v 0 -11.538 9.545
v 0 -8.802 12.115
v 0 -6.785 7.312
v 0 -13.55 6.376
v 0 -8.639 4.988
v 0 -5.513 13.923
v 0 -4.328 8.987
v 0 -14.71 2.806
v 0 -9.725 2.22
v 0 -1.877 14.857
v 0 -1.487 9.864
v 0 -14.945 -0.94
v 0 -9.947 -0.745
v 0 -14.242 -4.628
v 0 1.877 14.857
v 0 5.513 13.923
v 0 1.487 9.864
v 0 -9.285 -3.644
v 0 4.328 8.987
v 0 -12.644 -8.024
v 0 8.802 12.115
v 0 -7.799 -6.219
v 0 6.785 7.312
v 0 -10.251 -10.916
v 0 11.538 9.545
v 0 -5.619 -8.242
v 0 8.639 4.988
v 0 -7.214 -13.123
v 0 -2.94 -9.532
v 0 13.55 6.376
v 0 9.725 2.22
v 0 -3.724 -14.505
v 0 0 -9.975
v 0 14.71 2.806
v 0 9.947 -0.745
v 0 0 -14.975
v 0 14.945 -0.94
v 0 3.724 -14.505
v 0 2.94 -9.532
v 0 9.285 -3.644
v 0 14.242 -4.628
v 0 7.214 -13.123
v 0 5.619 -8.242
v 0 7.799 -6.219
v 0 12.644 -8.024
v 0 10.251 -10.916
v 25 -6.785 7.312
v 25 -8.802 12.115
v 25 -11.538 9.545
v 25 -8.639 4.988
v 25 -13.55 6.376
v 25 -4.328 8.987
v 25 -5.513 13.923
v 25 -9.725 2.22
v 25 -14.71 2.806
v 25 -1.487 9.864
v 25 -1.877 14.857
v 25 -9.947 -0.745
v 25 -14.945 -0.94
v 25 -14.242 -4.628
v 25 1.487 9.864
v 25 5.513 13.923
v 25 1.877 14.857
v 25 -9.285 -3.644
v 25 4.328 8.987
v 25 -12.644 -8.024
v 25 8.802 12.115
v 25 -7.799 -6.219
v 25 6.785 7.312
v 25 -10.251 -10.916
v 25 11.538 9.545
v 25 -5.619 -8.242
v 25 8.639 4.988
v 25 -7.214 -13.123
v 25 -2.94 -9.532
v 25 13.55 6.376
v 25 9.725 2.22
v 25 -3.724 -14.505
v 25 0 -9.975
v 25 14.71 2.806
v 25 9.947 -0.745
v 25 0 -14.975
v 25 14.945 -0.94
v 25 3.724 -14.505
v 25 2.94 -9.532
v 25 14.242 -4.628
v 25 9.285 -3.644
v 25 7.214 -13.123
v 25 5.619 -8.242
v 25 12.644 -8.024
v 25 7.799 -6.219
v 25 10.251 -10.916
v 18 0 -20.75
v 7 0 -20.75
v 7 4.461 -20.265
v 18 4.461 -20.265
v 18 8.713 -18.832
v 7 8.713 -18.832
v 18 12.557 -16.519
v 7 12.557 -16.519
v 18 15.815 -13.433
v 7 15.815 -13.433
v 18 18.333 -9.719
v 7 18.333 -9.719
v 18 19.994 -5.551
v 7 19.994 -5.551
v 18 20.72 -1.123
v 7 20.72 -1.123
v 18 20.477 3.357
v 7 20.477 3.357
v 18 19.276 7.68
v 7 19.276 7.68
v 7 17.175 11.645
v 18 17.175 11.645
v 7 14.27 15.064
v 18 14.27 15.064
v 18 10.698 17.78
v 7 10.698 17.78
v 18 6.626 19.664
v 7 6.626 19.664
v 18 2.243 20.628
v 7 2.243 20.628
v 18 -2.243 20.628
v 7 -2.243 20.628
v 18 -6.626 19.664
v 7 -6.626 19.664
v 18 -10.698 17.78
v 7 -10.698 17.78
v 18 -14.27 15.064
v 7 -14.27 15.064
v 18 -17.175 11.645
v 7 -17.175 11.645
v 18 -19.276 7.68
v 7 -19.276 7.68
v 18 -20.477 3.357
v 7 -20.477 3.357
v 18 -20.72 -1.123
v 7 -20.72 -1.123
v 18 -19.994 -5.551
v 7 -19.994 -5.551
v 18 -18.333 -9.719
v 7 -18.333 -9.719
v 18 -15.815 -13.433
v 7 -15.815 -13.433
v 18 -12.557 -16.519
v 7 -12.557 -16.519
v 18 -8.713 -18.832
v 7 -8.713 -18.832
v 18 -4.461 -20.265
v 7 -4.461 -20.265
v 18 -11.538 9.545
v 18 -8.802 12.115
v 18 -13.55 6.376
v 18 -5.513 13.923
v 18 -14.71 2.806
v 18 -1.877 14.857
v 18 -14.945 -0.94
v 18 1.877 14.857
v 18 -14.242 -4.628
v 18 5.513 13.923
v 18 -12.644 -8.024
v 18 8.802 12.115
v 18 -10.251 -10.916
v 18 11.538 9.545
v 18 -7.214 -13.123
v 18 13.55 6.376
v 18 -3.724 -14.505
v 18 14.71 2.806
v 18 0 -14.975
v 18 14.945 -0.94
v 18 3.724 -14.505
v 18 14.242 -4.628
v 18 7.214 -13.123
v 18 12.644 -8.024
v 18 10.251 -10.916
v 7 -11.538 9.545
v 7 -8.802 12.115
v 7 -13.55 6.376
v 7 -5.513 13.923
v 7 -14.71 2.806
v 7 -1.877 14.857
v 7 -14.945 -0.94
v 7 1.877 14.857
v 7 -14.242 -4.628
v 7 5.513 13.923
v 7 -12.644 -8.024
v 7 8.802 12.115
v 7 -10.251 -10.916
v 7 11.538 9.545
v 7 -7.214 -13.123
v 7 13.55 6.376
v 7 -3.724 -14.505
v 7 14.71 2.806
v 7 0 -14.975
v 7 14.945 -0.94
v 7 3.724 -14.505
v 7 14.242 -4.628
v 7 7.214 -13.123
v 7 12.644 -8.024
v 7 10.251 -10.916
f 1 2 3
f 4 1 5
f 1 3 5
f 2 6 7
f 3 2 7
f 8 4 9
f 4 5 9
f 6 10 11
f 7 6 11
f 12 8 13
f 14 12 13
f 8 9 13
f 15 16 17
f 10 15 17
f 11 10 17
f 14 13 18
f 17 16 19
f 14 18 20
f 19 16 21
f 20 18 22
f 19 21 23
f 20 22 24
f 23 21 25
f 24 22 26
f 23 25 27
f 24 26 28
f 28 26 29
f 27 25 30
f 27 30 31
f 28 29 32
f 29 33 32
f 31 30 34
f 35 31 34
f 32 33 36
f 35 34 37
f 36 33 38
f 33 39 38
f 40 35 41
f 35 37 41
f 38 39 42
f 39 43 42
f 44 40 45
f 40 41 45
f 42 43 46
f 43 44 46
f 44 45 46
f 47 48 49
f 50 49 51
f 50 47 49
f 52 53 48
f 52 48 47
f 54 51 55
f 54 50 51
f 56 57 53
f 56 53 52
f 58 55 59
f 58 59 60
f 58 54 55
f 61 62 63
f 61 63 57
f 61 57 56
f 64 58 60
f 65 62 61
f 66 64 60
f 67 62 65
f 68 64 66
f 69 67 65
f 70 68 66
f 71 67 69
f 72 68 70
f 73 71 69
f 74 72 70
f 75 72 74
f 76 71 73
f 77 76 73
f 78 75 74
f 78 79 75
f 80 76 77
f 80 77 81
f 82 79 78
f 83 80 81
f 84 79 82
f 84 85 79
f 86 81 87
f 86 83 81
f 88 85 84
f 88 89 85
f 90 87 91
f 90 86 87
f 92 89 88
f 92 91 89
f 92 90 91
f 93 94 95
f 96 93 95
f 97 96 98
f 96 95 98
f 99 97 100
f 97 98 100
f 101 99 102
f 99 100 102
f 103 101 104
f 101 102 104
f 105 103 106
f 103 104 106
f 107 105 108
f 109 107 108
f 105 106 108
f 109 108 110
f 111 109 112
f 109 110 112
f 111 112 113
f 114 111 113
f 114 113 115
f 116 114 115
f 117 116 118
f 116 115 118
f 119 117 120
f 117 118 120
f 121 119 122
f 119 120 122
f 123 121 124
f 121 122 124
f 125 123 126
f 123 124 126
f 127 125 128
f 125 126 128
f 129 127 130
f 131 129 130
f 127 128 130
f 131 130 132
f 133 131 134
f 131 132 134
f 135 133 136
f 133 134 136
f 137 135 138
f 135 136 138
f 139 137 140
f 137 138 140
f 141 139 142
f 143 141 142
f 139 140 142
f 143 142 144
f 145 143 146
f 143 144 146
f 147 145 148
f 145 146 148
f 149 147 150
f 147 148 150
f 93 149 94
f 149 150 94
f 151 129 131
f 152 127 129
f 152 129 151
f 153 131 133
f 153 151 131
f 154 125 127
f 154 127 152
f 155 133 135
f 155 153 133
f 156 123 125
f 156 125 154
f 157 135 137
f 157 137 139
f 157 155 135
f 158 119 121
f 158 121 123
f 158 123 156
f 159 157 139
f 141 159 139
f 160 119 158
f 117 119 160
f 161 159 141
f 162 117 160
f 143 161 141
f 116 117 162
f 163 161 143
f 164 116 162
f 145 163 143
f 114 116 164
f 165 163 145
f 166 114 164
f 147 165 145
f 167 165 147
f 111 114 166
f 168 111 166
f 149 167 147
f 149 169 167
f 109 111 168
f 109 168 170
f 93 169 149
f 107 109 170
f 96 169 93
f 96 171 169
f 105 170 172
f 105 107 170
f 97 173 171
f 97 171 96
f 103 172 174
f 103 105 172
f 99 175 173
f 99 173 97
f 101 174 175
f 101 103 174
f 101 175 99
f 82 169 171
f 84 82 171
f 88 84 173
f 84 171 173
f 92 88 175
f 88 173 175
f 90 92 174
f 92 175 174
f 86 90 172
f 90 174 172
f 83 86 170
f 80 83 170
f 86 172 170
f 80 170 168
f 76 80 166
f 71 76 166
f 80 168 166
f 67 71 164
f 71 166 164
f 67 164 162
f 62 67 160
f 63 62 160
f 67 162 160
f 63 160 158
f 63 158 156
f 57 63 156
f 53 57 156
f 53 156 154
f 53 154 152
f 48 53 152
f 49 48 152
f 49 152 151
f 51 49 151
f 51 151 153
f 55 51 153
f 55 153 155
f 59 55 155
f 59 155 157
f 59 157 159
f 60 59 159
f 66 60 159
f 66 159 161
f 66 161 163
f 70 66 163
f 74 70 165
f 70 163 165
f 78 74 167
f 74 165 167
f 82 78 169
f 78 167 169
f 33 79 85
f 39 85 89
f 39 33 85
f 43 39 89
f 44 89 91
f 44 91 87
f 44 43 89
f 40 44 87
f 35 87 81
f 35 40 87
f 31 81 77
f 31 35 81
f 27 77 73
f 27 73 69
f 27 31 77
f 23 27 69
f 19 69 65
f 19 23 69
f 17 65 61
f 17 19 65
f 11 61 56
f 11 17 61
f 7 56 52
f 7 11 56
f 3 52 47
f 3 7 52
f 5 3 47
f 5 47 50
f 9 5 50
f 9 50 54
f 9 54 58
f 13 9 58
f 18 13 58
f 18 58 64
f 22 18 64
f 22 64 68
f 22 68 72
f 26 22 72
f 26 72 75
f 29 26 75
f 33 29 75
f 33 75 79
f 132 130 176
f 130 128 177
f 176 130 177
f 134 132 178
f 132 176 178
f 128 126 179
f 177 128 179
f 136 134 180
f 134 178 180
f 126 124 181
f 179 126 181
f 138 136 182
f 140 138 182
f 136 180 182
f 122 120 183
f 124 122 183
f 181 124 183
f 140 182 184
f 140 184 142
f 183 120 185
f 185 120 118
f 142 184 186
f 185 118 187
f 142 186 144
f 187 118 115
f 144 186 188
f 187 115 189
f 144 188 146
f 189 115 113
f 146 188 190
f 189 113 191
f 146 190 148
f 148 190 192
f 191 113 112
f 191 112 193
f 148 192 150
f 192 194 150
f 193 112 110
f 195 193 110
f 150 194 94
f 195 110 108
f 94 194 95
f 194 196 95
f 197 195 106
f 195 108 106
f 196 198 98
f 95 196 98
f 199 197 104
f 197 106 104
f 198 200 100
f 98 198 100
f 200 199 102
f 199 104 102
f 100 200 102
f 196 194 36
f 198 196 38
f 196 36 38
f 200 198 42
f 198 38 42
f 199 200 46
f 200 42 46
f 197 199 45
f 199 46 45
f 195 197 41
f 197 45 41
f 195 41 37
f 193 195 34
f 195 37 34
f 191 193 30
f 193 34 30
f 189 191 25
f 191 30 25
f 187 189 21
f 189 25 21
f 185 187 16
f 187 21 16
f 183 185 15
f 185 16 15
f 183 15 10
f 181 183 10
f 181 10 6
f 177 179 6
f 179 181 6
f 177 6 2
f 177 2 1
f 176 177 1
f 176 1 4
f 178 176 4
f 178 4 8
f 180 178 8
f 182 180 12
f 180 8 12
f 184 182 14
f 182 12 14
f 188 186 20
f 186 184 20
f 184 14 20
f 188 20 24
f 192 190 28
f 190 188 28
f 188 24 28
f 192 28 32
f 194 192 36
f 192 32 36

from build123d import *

# Parameters (mm, degrees)
SKETCH1_R                = 14.975
SKETCH1_R_2              = 9.975
BOSS_EXTRUDE1_DEPTH      = 25
BOSS_EXTRUDE2_DEPTH      = 5.5
BOSS_EXTRUDE2_DEPTH_BACK = 5.5
SKETCH2_R                = 20.75
SKETCH2_R_2              = 9.975


with BuildPart() as part:
    # Sketch1 → Boss-Extrude1 (new body)
    with BuildSketch(Plane(origin=(0, 0, 0), x_dir=(0, 0, -1), z_dir=(1, 0, 0))):
        Circle(SKETCH1_R)
        Circle(SKETCH1_R_2, mode=Mode.SUBTRACT)
    extrude(amount=BOSS_EXTRUDE1_DEPTH)

    # Sketch2 → Boss-Extrude2 (add, two sides: drawn at the far end of the back side and taken through both)
    with BuildSketch(Plane(origin=(12.5, 0, 0), x_dir=(0, 0, -1), z_dir=(1, 0, 0)).offset(-BOSS_EXTRUDE2_DEPTH_BACK)):
        Circle(SKETCH2_R)
        Circle(SKETCH2_R_2, mode=Mode.SUBTRACT)
    extrude(amount=BOSS_EXTRUDE2_DEPTH + BOSS_EXTRUDE2_DEPTH_BACK)


solid = part.part
